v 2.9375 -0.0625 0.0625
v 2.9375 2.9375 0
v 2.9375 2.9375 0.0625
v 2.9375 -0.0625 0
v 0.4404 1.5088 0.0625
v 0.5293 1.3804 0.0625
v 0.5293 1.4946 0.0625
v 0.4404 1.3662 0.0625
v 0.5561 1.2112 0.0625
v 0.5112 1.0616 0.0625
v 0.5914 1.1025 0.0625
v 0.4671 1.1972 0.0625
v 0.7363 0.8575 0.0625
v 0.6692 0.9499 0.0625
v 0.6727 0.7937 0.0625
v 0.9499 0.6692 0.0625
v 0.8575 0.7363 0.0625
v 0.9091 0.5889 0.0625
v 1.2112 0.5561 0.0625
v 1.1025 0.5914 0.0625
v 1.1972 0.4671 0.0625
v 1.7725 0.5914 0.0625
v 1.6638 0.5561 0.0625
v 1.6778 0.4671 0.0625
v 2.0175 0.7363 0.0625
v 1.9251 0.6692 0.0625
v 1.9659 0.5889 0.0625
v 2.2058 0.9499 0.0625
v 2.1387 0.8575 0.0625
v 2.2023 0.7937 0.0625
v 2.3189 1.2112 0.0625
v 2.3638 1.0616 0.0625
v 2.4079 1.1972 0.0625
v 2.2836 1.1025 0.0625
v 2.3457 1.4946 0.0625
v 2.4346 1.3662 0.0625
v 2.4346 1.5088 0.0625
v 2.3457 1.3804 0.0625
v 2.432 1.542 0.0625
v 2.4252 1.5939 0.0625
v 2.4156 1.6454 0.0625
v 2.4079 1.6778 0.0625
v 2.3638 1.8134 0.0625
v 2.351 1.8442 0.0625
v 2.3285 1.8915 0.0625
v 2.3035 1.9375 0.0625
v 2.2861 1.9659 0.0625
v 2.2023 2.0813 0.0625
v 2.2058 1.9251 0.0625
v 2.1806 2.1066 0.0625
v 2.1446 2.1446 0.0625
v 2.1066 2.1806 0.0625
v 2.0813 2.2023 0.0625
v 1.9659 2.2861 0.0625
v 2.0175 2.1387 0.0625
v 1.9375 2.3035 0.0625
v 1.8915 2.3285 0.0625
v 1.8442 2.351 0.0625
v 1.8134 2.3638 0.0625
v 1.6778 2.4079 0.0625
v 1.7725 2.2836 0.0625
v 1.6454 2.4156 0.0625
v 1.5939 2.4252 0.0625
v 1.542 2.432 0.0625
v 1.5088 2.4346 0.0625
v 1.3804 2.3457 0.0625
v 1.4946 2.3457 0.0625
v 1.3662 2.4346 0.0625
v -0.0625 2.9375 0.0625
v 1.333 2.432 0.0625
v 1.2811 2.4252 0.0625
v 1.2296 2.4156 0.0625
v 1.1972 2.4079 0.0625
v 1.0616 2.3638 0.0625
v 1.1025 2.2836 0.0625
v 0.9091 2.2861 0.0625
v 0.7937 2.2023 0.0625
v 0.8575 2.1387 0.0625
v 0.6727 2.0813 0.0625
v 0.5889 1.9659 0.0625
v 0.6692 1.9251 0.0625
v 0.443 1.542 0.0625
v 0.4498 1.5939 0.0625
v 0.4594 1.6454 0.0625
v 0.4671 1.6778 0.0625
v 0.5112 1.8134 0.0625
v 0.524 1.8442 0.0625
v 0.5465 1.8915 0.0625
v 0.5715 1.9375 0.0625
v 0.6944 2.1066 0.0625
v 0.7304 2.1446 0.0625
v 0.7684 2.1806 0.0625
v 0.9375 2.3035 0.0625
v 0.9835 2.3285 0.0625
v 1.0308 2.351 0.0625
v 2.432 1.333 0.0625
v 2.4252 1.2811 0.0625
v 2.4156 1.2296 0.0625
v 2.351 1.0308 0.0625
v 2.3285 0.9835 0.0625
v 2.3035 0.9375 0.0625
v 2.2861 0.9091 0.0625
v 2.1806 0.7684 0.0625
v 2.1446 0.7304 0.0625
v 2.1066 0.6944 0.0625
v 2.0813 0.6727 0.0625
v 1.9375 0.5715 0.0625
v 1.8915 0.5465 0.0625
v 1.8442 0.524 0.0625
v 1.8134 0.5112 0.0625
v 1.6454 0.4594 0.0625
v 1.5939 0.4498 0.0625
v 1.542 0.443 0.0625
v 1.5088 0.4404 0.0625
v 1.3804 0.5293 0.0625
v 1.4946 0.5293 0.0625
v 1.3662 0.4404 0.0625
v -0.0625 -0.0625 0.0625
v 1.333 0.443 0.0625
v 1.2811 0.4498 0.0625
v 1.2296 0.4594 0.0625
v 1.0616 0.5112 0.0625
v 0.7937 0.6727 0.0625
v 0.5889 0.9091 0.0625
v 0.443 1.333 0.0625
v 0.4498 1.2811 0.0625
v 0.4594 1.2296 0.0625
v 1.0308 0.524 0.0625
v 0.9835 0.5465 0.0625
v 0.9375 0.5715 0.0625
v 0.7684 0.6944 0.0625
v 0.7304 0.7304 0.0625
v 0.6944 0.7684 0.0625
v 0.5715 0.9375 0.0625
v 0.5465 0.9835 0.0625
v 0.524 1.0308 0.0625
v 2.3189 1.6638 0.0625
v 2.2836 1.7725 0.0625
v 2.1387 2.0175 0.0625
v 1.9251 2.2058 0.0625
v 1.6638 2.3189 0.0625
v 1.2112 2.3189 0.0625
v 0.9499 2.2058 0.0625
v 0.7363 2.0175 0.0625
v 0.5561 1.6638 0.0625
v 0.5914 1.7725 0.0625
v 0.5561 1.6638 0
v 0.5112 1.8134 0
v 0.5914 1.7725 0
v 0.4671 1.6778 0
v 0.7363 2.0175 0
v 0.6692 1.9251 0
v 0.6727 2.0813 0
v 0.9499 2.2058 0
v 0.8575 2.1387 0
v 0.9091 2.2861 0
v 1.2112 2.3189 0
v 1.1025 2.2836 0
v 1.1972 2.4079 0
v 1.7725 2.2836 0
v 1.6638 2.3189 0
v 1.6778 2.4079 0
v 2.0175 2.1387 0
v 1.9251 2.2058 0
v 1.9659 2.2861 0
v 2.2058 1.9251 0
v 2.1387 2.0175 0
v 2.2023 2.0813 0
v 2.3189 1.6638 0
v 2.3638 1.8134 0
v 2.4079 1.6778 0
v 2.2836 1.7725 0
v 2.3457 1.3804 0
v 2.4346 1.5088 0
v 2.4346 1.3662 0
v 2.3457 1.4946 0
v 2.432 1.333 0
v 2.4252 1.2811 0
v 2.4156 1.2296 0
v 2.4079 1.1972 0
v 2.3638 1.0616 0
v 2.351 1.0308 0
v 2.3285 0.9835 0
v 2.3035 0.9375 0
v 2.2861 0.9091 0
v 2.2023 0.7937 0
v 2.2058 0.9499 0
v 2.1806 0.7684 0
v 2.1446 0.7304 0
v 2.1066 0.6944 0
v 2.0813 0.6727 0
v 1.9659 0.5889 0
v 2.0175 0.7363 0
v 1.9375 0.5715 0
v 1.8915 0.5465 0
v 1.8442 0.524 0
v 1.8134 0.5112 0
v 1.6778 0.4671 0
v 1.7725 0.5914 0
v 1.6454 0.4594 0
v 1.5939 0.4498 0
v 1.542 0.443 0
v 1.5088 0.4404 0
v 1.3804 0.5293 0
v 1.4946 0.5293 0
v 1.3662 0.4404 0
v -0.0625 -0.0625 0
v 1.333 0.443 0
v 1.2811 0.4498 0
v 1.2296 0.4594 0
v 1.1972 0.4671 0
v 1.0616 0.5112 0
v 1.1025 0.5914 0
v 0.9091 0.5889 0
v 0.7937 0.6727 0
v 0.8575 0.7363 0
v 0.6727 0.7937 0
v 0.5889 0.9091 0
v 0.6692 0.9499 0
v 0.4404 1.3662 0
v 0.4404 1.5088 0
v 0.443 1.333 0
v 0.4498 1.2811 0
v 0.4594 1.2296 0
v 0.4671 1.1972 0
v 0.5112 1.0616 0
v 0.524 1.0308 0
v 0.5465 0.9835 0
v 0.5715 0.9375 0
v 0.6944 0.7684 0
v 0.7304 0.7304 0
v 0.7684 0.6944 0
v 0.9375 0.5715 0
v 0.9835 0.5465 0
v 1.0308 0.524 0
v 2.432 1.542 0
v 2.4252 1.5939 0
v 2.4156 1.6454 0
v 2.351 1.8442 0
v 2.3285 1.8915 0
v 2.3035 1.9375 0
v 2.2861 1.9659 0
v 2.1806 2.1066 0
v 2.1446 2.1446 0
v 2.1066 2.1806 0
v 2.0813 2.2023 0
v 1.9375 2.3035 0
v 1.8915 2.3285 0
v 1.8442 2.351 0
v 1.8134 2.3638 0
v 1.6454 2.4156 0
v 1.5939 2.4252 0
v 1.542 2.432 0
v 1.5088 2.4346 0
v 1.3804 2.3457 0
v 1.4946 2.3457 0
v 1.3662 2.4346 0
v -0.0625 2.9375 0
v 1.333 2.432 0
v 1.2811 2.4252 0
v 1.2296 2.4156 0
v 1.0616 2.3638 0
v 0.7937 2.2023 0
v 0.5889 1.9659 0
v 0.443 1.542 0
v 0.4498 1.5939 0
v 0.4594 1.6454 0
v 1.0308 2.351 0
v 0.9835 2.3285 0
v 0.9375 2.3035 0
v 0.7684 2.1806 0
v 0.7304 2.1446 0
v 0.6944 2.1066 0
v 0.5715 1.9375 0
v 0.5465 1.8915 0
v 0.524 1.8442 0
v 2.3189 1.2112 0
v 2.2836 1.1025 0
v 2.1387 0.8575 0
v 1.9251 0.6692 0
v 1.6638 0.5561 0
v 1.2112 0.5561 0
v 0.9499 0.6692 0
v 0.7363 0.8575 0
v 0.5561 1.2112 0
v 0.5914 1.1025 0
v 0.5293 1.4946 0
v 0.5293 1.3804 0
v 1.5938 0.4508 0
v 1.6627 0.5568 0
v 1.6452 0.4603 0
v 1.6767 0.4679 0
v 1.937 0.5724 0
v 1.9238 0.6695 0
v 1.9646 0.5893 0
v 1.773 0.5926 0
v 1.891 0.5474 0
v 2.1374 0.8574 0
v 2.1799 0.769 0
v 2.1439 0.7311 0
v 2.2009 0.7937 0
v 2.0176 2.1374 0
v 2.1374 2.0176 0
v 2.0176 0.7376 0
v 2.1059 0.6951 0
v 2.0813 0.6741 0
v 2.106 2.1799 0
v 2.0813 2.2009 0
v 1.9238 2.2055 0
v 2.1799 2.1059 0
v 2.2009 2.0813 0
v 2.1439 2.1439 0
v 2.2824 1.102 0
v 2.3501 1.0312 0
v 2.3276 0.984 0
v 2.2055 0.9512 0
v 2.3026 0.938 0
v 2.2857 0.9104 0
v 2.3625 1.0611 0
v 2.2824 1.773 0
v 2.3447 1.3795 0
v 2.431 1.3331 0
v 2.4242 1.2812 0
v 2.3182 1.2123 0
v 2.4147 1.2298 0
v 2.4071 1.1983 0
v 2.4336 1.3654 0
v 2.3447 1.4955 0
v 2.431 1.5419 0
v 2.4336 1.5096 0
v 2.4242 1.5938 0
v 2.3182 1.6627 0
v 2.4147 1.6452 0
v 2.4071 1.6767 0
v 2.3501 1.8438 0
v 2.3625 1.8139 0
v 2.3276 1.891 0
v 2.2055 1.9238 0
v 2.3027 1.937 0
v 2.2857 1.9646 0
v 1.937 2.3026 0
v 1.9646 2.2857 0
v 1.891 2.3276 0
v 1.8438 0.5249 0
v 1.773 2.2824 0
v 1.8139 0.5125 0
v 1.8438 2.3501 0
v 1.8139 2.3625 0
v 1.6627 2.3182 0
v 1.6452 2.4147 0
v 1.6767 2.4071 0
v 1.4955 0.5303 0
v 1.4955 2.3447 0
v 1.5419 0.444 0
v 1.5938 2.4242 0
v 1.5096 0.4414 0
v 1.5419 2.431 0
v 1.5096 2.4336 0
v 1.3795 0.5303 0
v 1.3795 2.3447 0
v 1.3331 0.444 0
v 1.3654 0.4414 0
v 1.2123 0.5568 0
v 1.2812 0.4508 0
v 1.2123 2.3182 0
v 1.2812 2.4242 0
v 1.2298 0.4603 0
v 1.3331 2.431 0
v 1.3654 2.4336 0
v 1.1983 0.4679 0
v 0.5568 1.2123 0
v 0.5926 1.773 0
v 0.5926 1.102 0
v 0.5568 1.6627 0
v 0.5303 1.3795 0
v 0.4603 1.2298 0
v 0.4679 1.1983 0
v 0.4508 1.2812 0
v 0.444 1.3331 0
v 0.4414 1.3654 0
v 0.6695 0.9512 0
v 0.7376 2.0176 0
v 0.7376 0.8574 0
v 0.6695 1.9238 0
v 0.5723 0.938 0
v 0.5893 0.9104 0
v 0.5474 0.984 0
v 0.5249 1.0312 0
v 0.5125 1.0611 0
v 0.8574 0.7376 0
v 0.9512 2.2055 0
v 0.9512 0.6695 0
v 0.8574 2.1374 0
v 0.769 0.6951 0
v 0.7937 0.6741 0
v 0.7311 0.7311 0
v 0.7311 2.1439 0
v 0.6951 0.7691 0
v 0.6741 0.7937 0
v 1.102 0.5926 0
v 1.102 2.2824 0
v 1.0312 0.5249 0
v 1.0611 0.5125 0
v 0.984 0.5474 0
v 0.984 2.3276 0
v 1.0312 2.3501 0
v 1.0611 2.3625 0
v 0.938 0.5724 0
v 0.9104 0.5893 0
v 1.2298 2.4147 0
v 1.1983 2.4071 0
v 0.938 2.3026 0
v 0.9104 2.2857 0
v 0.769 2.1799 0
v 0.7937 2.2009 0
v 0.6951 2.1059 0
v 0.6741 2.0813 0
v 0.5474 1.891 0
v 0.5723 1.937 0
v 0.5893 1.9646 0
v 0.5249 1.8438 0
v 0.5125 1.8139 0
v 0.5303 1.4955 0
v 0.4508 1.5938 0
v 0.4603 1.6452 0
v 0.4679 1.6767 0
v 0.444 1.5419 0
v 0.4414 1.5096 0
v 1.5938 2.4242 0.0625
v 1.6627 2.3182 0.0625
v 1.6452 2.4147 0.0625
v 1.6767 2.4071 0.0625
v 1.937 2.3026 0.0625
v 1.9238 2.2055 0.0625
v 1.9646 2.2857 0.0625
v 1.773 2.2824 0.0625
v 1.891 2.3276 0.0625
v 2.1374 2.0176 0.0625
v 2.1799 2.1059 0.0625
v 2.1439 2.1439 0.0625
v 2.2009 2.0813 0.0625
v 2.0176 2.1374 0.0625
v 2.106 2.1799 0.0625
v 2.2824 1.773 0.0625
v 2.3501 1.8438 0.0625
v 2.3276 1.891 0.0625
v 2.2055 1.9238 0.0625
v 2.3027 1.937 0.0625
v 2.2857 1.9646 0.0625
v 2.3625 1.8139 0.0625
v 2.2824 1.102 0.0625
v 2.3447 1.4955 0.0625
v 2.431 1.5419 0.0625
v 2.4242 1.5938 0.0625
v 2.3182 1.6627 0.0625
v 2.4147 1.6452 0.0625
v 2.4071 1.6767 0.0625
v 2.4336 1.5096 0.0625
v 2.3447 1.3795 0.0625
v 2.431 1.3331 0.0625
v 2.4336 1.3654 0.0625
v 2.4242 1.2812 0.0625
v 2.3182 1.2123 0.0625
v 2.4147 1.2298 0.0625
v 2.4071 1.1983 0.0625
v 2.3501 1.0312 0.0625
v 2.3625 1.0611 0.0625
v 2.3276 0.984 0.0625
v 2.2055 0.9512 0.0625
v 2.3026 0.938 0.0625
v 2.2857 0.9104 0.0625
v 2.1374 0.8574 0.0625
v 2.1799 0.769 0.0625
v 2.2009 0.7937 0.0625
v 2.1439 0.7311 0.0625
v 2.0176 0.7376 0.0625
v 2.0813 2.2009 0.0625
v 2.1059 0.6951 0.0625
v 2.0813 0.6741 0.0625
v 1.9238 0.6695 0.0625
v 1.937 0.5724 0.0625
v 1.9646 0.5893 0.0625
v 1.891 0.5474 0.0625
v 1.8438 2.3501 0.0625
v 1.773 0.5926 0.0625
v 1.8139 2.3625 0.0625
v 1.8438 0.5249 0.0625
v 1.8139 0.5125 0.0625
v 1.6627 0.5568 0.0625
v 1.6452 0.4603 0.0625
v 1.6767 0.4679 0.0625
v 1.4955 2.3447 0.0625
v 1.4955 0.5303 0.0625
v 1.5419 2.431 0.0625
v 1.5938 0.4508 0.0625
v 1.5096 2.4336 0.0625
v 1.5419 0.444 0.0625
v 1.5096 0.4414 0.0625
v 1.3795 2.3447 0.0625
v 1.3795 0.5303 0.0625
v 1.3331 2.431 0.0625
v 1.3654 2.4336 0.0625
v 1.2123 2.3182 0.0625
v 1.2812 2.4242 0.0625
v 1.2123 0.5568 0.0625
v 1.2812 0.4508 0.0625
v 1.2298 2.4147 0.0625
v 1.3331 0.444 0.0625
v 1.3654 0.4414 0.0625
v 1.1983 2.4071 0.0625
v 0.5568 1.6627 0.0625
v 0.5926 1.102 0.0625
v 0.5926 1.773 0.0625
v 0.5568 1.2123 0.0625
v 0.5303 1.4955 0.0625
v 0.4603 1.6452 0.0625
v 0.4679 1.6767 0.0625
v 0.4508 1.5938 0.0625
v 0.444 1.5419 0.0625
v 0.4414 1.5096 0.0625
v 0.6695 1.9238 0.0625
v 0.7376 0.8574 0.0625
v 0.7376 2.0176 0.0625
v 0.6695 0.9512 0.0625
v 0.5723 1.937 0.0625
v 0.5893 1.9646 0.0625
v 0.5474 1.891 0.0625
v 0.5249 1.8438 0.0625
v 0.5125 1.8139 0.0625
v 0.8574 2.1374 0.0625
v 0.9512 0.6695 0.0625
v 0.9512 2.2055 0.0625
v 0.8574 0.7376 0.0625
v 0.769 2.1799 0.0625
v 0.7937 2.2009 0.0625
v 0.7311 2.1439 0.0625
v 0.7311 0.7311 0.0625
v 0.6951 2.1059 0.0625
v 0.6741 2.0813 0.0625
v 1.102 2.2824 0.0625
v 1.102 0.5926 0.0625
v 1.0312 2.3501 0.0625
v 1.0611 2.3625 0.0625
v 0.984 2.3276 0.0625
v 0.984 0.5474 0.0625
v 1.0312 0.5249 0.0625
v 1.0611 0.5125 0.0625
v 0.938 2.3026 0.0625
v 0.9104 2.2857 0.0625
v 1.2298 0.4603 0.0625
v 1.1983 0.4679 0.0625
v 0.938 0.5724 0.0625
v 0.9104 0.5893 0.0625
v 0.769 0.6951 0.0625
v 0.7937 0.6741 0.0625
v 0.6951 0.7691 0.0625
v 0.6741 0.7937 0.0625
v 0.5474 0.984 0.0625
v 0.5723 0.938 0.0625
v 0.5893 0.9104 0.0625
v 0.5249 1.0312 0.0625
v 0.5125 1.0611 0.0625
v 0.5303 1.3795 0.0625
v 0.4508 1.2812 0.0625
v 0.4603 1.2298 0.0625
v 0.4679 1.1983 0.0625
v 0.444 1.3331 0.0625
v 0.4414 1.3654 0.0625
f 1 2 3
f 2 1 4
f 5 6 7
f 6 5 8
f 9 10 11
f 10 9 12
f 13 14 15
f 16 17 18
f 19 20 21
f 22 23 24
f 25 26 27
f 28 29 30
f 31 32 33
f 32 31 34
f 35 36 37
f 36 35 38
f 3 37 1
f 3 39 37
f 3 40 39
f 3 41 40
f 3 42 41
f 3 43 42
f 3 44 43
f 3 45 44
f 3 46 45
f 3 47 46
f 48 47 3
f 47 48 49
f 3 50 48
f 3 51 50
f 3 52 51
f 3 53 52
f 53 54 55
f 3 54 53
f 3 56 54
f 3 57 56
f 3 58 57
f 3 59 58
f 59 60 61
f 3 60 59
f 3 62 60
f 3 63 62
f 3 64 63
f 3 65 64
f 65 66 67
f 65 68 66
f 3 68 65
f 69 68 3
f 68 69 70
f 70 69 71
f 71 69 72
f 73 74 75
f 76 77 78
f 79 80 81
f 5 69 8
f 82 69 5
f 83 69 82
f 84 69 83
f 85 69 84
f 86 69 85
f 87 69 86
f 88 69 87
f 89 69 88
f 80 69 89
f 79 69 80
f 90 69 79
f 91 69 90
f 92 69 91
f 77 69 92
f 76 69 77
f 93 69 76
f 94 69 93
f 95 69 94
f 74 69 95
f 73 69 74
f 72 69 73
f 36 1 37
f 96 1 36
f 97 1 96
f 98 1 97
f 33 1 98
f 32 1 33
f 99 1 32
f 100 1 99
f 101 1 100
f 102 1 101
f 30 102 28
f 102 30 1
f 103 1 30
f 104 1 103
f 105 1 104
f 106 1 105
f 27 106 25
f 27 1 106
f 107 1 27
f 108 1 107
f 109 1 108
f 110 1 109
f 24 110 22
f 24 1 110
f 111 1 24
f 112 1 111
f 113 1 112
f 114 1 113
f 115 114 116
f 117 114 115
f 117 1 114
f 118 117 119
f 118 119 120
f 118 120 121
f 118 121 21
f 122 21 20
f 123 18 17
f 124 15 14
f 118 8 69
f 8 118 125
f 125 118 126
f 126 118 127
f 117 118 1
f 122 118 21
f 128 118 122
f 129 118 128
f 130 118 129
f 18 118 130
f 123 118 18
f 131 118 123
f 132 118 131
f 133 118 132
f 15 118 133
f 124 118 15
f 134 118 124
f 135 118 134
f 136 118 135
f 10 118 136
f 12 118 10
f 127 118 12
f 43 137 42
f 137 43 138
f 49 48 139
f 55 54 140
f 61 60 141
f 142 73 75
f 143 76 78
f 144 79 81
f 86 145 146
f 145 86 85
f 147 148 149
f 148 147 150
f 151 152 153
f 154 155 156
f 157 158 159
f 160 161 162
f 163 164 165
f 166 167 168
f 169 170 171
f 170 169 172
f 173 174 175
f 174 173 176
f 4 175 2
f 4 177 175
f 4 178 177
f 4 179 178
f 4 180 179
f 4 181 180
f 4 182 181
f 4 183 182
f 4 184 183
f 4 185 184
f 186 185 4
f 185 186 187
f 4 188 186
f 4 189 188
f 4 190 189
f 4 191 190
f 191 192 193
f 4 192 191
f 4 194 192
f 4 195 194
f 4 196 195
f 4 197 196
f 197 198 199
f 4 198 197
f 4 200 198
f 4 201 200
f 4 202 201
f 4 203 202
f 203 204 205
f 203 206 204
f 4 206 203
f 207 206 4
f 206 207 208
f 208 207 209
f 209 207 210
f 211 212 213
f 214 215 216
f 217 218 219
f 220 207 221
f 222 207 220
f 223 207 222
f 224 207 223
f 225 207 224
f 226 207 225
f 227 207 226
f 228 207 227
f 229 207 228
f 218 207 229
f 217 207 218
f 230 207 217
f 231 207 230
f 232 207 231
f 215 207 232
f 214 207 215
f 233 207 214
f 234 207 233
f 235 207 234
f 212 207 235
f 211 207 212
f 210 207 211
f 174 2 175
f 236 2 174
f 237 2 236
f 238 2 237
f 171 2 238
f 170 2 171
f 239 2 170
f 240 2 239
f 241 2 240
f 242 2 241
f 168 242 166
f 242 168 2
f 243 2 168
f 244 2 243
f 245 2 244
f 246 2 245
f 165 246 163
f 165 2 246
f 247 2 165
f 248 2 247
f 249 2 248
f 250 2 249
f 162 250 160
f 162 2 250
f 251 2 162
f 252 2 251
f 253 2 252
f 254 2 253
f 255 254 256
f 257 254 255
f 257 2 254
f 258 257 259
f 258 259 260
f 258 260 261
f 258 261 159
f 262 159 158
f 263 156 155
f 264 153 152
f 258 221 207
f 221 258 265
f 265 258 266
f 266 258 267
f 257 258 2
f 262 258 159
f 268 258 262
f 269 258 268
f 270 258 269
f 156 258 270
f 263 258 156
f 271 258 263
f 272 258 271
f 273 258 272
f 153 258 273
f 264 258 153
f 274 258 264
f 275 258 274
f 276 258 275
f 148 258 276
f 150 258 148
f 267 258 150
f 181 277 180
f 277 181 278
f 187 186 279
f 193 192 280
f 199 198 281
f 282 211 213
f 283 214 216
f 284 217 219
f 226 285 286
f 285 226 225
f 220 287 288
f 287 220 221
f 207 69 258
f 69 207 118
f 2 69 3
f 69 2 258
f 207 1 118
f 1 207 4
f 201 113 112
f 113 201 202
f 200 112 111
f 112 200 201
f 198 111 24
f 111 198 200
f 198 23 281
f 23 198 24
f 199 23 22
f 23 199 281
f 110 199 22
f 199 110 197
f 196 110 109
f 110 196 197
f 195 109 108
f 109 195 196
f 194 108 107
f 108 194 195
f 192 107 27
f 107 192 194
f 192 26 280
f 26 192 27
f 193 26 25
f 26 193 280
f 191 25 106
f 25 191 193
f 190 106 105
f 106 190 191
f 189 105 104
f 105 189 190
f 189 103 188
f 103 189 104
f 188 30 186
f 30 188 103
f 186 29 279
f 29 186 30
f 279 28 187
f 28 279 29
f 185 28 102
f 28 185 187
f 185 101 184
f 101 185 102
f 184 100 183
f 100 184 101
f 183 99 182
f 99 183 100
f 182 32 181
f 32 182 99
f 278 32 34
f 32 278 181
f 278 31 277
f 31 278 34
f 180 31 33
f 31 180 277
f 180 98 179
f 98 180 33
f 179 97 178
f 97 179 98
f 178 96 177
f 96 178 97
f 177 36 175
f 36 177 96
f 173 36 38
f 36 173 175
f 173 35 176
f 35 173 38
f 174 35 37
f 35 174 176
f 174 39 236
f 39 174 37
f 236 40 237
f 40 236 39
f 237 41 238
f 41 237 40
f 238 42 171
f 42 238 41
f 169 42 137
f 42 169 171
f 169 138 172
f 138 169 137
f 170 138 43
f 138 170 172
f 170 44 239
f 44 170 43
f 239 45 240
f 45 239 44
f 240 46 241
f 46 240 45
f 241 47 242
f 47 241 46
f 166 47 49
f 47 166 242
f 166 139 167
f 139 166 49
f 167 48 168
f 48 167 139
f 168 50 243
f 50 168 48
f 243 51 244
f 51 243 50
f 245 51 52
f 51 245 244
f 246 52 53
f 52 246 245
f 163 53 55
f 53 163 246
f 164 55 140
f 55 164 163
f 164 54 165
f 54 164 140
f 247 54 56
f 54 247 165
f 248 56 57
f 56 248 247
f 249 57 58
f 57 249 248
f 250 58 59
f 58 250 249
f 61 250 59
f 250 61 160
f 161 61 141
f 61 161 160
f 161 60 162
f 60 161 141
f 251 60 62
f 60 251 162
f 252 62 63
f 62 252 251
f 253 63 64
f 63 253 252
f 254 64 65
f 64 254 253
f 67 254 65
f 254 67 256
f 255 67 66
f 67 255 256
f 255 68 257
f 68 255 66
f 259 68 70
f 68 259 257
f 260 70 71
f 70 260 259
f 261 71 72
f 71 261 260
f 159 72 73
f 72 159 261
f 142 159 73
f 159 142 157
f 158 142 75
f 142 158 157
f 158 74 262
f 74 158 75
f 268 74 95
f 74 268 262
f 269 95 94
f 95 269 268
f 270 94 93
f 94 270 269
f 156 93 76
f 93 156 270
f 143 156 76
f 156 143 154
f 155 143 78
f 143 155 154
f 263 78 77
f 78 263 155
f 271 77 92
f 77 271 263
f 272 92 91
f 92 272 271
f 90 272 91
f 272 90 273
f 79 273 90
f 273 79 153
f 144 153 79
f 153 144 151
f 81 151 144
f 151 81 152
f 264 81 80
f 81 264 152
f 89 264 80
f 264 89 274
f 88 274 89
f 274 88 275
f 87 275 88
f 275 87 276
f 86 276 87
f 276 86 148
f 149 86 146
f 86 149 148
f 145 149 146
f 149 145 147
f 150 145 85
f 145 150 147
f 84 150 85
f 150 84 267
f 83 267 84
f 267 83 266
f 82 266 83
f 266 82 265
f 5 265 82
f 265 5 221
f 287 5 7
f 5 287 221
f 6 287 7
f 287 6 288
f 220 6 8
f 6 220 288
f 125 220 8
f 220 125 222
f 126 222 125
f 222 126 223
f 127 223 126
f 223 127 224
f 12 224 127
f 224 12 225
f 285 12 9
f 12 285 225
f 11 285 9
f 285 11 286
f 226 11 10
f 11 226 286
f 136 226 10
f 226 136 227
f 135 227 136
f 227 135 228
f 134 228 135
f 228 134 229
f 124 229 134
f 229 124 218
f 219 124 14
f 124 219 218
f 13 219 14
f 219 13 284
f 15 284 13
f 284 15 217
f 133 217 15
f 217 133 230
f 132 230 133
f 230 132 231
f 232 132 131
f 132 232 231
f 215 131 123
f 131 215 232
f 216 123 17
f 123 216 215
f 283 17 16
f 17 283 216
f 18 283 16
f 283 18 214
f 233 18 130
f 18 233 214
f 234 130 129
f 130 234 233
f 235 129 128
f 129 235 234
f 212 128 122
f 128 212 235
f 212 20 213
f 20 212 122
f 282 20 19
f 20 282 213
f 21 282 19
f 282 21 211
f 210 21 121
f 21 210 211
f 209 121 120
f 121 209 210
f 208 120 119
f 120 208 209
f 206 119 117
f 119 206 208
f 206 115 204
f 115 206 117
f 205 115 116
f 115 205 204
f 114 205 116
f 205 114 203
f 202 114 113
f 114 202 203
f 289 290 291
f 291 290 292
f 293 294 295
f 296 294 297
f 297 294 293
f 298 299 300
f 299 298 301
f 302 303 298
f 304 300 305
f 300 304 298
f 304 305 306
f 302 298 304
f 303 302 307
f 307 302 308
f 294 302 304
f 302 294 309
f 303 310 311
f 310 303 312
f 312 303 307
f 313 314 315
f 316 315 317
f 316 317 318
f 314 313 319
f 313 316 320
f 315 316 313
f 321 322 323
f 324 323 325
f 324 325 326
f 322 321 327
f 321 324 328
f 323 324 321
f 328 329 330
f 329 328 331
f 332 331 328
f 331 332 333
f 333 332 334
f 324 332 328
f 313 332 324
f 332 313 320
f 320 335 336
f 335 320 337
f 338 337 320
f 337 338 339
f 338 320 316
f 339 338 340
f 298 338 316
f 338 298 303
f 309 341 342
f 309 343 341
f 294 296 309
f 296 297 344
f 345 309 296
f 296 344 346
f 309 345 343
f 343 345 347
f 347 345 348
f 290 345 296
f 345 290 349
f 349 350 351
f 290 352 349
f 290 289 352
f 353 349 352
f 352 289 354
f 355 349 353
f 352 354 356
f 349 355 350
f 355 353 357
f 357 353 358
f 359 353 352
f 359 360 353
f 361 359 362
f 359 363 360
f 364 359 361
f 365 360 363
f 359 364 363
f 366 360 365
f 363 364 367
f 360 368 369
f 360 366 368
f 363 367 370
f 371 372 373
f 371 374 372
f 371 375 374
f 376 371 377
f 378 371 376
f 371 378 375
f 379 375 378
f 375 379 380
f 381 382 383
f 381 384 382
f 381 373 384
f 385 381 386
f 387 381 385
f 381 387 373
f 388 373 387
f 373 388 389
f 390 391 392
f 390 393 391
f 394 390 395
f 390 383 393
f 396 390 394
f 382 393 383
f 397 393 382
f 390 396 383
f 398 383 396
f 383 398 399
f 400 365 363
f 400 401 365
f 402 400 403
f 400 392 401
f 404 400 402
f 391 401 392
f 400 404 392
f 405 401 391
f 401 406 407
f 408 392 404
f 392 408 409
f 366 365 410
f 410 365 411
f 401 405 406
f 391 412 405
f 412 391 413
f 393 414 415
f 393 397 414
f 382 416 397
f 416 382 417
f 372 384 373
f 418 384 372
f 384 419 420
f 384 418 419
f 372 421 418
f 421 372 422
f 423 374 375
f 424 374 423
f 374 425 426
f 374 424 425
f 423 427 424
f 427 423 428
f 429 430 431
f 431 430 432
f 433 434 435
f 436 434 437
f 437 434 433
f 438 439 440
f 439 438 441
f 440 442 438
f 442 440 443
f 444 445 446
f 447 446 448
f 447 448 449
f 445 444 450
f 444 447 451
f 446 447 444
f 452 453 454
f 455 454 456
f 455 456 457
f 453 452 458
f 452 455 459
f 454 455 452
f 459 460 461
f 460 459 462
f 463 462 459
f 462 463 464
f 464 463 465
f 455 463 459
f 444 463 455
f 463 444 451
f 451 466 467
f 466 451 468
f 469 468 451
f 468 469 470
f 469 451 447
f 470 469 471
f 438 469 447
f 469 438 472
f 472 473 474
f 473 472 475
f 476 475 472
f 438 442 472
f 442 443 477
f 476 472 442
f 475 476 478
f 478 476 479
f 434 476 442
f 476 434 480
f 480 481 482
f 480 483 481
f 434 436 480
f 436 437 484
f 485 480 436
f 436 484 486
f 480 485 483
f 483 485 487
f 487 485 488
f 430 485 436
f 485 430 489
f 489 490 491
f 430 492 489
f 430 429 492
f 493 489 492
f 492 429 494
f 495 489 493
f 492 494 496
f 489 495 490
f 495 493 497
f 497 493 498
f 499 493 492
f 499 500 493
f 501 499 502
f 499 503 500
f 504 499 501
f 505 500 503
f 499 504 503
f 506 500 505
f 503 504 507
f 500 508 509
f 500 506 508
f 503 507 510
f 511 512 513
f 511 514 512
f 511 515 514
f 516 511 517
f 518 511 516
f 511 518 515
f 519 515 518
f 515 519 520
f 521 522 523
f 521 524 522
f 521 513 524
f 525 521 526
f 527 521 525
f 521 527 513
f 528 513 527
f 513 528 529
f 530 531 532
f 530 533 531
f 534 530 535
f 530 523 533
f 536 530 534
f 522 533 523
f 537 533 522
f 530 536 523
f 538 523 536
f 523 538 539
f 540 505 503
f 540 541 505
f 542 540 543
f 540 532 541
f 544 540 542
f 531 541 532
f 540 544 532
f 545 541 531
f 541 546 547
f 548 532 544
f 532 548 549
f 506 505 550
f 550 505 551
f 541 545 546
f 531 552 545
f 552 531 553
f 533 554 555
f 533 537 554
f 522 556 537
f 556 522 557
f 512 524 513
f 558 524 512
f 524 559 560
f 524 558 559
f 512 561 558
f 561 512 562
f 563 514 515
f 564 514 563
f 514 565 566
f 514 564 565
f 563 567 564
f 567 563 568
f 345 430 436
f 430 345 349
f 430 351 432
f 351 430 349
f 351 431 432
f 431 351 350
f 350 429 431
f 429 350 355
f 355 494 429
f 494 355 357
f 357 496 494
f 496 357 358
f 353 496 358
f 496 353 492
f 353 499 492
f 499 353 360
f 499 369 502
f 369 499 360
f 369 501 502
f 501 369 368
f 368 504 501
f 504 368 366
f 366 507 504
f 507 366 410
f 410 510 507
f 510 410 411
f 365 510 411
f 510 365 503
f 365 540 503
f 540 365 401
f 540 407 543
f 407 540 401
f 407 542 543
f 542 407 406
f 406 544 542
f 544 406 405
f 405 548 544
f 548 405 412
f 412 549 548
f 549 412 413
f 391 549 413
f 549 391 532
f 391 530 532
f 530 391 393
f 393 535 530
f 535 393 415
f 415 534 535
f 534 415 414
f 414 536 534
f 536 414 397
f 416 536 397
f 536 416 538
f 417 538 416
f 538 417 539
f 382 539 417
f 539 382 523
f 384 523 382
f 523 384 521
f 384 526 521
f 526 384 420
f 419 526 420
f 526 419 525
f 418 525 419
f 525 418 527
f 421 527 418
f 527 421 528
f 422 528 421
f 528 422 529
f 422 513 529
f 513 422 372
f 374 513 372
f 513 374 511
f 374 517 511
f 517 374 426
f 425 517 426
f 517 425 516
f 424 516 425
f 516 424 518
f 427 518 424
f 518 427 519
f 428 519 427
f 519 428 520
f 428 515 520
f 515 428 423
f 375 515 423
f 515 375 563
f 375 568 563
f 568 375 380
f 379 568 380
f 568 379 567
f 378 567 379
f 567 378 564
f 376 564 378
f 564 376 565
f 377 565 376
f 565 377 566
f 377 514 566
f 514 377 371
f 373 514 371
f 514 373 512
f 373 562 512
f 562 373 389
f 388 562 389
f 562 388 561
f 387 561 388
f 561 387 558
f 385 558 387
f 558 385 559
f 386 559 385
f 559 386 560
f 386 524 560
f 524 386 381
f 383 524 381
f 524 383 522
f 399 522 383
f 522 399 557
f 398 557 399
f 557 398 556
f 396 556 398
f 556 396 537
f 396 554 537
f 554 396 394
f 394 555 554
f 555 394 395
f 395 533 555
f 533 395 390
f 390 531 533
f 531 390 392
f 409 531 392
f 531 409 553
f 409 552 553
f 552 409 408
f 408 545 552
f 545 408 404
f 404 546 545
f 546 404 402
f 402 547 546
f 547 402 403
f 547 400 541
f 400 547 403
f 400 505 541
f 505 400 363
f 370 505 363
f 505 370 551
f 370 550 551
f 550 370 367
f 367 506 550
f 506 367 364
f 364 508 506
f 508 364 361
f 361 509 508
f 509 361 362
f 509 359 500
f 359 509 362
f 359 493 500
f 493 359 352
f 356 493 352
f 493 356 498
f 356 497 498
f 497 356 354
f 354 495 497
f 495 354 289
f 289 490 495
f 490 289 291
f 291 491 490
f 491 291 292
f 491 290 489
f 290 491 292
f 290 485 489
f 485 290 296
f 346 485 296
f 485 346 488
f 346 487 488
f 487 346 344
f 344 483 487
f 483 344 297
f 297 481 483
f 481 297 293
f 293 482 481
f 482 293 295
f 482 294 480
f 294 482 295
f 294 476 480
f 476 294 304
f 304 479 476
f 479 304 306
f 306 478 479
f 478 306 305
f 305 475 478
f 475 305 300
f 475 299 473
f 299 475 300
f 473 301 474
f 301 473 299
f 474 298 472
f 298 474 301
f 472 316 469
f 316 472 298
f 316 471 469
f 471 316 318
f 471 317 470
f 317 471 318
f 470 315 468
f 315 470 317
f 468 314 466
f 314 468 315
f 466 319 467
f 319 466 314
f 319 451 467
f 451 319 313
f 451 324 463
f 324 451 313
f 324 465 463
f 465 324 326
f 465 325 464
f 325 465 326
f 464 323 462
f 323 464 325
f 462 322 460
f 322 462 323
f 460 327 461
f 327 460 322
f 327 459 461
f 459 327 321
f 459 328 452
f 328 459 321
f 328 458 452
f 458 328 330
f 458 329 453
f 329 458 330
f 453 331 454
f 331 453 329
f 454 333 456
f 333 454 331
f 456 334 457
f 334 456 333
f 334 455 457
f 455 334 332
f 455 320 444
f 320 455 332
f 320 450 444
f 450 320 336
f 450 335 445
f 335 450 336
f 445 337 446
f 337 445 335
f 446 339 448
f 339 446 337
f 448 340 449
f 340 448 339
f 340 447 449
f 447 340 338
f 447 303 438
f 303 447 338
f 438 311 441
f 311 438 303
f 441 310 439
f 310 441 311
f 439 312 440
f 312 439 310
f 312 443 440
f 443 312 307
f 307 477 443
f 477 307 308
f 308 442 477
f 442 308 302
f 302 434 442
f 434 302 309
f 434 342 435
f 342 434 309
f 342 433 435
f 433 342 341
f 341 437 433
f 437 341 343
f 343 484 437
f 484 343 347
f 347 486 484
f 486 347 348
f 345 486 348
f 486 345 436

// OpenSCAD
// element120-B.scad
// Vortex Portal (Orange) — orange ring with inner fill, dashes, and upward arrow;
// letter "B" marks this variant.
// Units: inches

plate_w = 2 + 7/8;
plate_d = 2 + 7/8;
plate_h = 1/16;
frame_w = 1/16;
hole_d  = 3/32;
hole_r  = hole_d / 2;

cx = plate_w / 2;
cy = plate_d / 2;

// Orange ring — same radii as the element100/110 gear ring
ring_r_out = 1.18;
ring_r_in  = 1.00;

// Inward-pointing teeth cut into the ring's inner edge (same technique as element110-2)
ring_n        = 20;
ring_tooth_hw = 4.5;
ring_tooth_f  = 0.80;
ring_tooth_d  = 0.09;   // tooth depth, same as the gear tiles' tooth depth

// Orange dashed arc inside the ring, lower arc (portal intake indicator)
dash_r     = 0.73;
dash_count = 8;
dash_a1    = 205;
dash_a2    = 335;
dash_w     = 0.074;
dash_len   = 0.140;

// Orange upward arrow — bottom unchanged, tip restored to original position
arr_stem_w  = 0.40;
arr_stem_y1 = cy - 0.44;
arr_stem_y2 = cy + 0.20;
arr_head_w  = 0.90;
arr_head_h  = 0.38;

// ── Standard modules ─────────────────────────────────────────────────────────

module rivet_holes() {
    spacing_x = plate_w / 10;
    spacing_y = plate_d / 10;
    inset_x   = spacing_x / 2;
    inset_y   = spacing_y / 2;
    for (i = [0:9]) translate([inset_x + i * spacing_x, inset_y,           -1]) cylinder(h = plate_h + 2, r = hole_r, $fn = 20);
    for (i = [0:9]) translate([inset_x + i * spacing_x, plate_d - inset_y, -1]) cylinder(h = plate_h + 2, r = hole_r, $fn = 20);
    for (i = [0:9]) translate([inset_x,           inset_y + i * spacing_y, -1]) cylinder(h = plate_h + 2, r = hole_r, $fn = 20);
    for (i = [0:9]) translate([plate_w - inset_x, inset_y + i * spacing_y, -1]) cylinder(h = plate_h + 2, r = hole_r, $fn = 20);
}

module frame_with_id(colors = []) {
    id_cover = plate_h / 8;
    region_w = plate_w / 6;
    region_d = plate_d / 6;
    mark_h   = plate_h - id_cover;

    color("black")
    difference() {
        translate([-frame_w, -frame_w, 0])
            cube([plate_w + 2 * frame_w, plate_d + 2 * frame_w, plate_h]);
        translate([0, 0, -0.001])
            cube([plate_w, plate_d, plate_h + 0.002]);
        // top/bottom/left/right straight runs only — corners stay solid black
        translate([0, plate_d - 0.001, -0.001])
            cube([plate_w, frame_w + 0.002, plate_h + 0.002]);
        translate([0, -frame_w - 0.001, -0.001])
            cube([plate_w, frame_w + 0.002, plate_h + 0.002]);
        translate([-frame_w - 0.001, 0, -0.001])
            cube([frame_w + 0.002, plate_d, plate_h + 0.002]);
        translate([plate_w - 0.001, 0, -0.001])
            cube([frame_w + 0.002, plate_d, plate_h + 0.002]);
    }

    for (i = [0:5]) {
        c     = (colors[i] != undef) ? colors[i] : "black";

        // top edge
        color(c) translate([i * region_w, plate_d, 0]) cube([region_w, frame_w, mark_h]);
        color("black") translate([i * region_w, plate_d, mark_h]) cube([region_w, frame_w, id_cover]);

        // bottom edge (reversed)
        color(c) translate([(5-i) * region_w, -frame_w, 0]) cube([region_w, frame_w, mark_h]);
        color("black") translate([(5-i) * region_w, -frame_w, mark_h]) cube([region_w, frame_w, id_cover]);

        // left edge
        color(c) translate([-frame_w, i * region_d, 0]) cube([frame_w, region_d, mark_h]);
        color("black") translate([-frame_w, i * region_d, mark_h]) cube([frame_w, region_d, id_cover]);

        // right edge (reversed)
        color(c) translate([plate_w, (5-i) * region_d, 0]) cube([frame_w, region_d, mark_h]);
        color("black") translate([plate_w, (5-i) * region_d, mark_h]) cube([frame_w, region_d, id_cover]);
    }
}

// Plate with rivet holes only — all other holes are added at assembly level
module plate() {
    difference() {
        color("darkgray")
            cube([plate_w, plate_d, plate_h]);
        rivet_holes();
    }
}

rivet_h = plate_h;
module rivets() {
    spacing_x = plate_w / 10;
    spacing_y = plate_d / 10;
    inset_x   = spacing_x / 2;
    inset_y   = spacing_y / 2;
    color("lightgray") {
        for (i = [0:9]) translate([inset_x + i * spacing_x, inset_y,           0]) cylinder(h = rivet_h, r = hole_r, $fn = 20);
        for (i = [0:9]) translate([inset_x + i * spacing_x, plate_d - inset_y, 0]) cylinder(h = rivet_h, r = hole_r, $fn = 20);
        for (i = [0:9]) translate([inset_x,           inset_y + i * spacing_y, 0]) cylinder(h = rivet_h, r = hole_r, $fn = 20);
        for (i = [0:9]) translate([plate_w - inset_x, inset_y + i * spacing_y, 0]) cylinder(h = rivet_h, r = hole_r, $fn = 20);
    }
}

// ── Ring 2D helpers ───────────────────────────────────────────────────────────

module ring_tooth_2d() {
    r_outer = ring_r_in + ring_tooth_d;
    r_inner = ring_r_in - ring_tooth_d;
    polygon([
        [r_outer * cos(-ring_tooth_hw),               r_outer * sin(-ring_tooth_hw)],
        [r_inner * cos(-ring_tooth_hw * ring_tooth_f), r_inner * sin(-ring_tooth_hw * ring_tooth_f)],
        [r_inner * cos( ring_tooth_hw * ring_tooth_f), r_inner * sin( ring_tooth_hw * ring_tooth_f)],
        [r_outer * cos( ring_tooth_hw),               r_outer * sin( ring_tooth_hw)],
    ]);
}

module ring_2d() {
    circle(r = ring_r_out, $fn = 120);
}

module ring_bore_2d() {
    pitch = 360 / ring_n;
    difference() {
        circle(r = ring_r_in, $fn = 120);
        for (i = [0:ring_n - 1]) rotate([0, 0, i * pitch]) ring_tooth_2d();
    }
}

// ── Ring hole & ring ─────────────────────────────────────────────────────────

module ring_holes() {
    translate([cx, cy, -1])
    linear_extrude(plate_h + 2)
    difference() {
        ring_2d();
        ring_bore_2d();
    }
}

module white_ring() {
    color("orange")
    translate([cx, cy, 0])
    linear_extrude(plate_h)
    difference() {
        ring_2d();
        ring_bore_2d();
    }
}

// ── Inner fill hole & inner fill ─────────────────────────────────────────────

module inner_fill_holes() {
    translate([cx, cy, -1])
    linear_extrude(plate_h + 2)
    ring_bore_2d();
}

module inner_fill() {
    color("lightgray")
    translate([cx, cy, 0])
    linear_extrude(plate_h)
    offset(delta = -0.001) ring_bore_2d();
}

// ── Dash holes & dashes ───────────────────────────────────────────────────────

module dash_holes() {
    span = dash_a2 - dash_a1;
    for (i = [0 : dash_count - 1]) {
        angle = dash_a1 + span * i / (dash_count - 1);
        dx = cx + dash_r * cos(angle);
        dy = cy + dash_r * sin(angle);
        translate([dx, dy, -1])
        rotate([0, 0, angle + 90])
        linear_extrude(plate_h + 2)
        square([dash_w, dash_len], center = true);
    }
}

module white_dashes() {
    span = dash_a2 - dash_a1;
    color("orange") {
        for (i = [0 : dash_count - 1]) {
            angle = dash_a1 + span * i / (dash_count - 1);
            dx = cx + dash_r * cos(angle);
            dy = cy + dash_r * sin(angle);
            translate([dx, dy, 0])
            rotate([0, 0, angle + 90])
            linear_extrude(plate_h)
            square([dash_w, dash_len], center = true);
        }
    }
}

// ── Arrow hole & arrow ────────────────────────────────────────────────────────

module arrow_holes() {
    translate([0, 0, -1])
    linear_extrude(plate_h + 2)
    union() {
        translate([cx - arr_stem_w / 2, arr_stem_y1])
            square([arr_stem_w, arr_stem_y2 - arr_stem_y1]);
        translate([cx, arr_stem_y2])
            polygon([
                [-arr_head_w / 2, 0],
                [ arr_head_w / 2, 0],
                [0, arr_head_h]
            ]);
    }
}

module white_arrow() {
    color("orange")
    linear_extrude(plate_h)
    union() {
        translate([cx - arr_stem_w / 2, arr_stem_y1])
            square([arr_stem_w, arr_stem_y2 - arr_stem_y1]);
        translate([cx, arr_stem_y2])
            polygon([
                [-arr_head_w / 2, 0],
                [ arr_head_w / 2, 0],
                [0, arr_head_h]
            ]);
    }
}

// ── Label hole → label ────────────────────────────────────────────────────────

module label_holes() {
    translate([cx, cy, -1])
    linear_extrude(plate_h + 2)
    text("B", size = .3, halign = "center", valign = "center",
         font = "Liberation Sans:style=Bold");
}

module label() {
    color("white")
    translate([cx, cy, 0])
    linear_extrude(plate_h)
    text("B", size = .3, halign = "center", valign = "center",
         font = "Liberation Sans:style=Bold");
}

// ── Assembly ──────────────────────────────────────────────────────────────────
// Each level: difference() cuts the holes INTO the running assembly,
//             union() then adds the feature that fills those holes.
// Innermost = first step; outermost = last step.

frame_with_id(["orange", undef, "orange", "orange", "orange", "orange"]);

union() {                                           // step 5: add label
    difference() {
        union() {                                   // step 4: add dashes & arrow
            difference() {
                union() {                           // step 3: add inner fill
                    difference() {
                        union() {                   // step 2: add ring
                            difference() {
                                // step 1: plate & rivet holes + rivets
                                union() {
                                    plate();
                                    rivets();
                                }
                                ring_holes();               // cut ring holes
                            }
                            white_ring();                   // fill with ring
                        }
                        inner_fill_holes();                 // cut inner fill holes
                    }
                    inner_fill();                           // fill with inner fill
                }
                dash_holes();                               // cut dash holes
                arrow_holes();                               // cut arrow holes
            }
            white_dashes();                                 // fill with dashes
            white_arrow();                                  // fill with arrow
        }
        label_holes();                                      // cut label hole
    }
    label();                                                // fill with label
}
